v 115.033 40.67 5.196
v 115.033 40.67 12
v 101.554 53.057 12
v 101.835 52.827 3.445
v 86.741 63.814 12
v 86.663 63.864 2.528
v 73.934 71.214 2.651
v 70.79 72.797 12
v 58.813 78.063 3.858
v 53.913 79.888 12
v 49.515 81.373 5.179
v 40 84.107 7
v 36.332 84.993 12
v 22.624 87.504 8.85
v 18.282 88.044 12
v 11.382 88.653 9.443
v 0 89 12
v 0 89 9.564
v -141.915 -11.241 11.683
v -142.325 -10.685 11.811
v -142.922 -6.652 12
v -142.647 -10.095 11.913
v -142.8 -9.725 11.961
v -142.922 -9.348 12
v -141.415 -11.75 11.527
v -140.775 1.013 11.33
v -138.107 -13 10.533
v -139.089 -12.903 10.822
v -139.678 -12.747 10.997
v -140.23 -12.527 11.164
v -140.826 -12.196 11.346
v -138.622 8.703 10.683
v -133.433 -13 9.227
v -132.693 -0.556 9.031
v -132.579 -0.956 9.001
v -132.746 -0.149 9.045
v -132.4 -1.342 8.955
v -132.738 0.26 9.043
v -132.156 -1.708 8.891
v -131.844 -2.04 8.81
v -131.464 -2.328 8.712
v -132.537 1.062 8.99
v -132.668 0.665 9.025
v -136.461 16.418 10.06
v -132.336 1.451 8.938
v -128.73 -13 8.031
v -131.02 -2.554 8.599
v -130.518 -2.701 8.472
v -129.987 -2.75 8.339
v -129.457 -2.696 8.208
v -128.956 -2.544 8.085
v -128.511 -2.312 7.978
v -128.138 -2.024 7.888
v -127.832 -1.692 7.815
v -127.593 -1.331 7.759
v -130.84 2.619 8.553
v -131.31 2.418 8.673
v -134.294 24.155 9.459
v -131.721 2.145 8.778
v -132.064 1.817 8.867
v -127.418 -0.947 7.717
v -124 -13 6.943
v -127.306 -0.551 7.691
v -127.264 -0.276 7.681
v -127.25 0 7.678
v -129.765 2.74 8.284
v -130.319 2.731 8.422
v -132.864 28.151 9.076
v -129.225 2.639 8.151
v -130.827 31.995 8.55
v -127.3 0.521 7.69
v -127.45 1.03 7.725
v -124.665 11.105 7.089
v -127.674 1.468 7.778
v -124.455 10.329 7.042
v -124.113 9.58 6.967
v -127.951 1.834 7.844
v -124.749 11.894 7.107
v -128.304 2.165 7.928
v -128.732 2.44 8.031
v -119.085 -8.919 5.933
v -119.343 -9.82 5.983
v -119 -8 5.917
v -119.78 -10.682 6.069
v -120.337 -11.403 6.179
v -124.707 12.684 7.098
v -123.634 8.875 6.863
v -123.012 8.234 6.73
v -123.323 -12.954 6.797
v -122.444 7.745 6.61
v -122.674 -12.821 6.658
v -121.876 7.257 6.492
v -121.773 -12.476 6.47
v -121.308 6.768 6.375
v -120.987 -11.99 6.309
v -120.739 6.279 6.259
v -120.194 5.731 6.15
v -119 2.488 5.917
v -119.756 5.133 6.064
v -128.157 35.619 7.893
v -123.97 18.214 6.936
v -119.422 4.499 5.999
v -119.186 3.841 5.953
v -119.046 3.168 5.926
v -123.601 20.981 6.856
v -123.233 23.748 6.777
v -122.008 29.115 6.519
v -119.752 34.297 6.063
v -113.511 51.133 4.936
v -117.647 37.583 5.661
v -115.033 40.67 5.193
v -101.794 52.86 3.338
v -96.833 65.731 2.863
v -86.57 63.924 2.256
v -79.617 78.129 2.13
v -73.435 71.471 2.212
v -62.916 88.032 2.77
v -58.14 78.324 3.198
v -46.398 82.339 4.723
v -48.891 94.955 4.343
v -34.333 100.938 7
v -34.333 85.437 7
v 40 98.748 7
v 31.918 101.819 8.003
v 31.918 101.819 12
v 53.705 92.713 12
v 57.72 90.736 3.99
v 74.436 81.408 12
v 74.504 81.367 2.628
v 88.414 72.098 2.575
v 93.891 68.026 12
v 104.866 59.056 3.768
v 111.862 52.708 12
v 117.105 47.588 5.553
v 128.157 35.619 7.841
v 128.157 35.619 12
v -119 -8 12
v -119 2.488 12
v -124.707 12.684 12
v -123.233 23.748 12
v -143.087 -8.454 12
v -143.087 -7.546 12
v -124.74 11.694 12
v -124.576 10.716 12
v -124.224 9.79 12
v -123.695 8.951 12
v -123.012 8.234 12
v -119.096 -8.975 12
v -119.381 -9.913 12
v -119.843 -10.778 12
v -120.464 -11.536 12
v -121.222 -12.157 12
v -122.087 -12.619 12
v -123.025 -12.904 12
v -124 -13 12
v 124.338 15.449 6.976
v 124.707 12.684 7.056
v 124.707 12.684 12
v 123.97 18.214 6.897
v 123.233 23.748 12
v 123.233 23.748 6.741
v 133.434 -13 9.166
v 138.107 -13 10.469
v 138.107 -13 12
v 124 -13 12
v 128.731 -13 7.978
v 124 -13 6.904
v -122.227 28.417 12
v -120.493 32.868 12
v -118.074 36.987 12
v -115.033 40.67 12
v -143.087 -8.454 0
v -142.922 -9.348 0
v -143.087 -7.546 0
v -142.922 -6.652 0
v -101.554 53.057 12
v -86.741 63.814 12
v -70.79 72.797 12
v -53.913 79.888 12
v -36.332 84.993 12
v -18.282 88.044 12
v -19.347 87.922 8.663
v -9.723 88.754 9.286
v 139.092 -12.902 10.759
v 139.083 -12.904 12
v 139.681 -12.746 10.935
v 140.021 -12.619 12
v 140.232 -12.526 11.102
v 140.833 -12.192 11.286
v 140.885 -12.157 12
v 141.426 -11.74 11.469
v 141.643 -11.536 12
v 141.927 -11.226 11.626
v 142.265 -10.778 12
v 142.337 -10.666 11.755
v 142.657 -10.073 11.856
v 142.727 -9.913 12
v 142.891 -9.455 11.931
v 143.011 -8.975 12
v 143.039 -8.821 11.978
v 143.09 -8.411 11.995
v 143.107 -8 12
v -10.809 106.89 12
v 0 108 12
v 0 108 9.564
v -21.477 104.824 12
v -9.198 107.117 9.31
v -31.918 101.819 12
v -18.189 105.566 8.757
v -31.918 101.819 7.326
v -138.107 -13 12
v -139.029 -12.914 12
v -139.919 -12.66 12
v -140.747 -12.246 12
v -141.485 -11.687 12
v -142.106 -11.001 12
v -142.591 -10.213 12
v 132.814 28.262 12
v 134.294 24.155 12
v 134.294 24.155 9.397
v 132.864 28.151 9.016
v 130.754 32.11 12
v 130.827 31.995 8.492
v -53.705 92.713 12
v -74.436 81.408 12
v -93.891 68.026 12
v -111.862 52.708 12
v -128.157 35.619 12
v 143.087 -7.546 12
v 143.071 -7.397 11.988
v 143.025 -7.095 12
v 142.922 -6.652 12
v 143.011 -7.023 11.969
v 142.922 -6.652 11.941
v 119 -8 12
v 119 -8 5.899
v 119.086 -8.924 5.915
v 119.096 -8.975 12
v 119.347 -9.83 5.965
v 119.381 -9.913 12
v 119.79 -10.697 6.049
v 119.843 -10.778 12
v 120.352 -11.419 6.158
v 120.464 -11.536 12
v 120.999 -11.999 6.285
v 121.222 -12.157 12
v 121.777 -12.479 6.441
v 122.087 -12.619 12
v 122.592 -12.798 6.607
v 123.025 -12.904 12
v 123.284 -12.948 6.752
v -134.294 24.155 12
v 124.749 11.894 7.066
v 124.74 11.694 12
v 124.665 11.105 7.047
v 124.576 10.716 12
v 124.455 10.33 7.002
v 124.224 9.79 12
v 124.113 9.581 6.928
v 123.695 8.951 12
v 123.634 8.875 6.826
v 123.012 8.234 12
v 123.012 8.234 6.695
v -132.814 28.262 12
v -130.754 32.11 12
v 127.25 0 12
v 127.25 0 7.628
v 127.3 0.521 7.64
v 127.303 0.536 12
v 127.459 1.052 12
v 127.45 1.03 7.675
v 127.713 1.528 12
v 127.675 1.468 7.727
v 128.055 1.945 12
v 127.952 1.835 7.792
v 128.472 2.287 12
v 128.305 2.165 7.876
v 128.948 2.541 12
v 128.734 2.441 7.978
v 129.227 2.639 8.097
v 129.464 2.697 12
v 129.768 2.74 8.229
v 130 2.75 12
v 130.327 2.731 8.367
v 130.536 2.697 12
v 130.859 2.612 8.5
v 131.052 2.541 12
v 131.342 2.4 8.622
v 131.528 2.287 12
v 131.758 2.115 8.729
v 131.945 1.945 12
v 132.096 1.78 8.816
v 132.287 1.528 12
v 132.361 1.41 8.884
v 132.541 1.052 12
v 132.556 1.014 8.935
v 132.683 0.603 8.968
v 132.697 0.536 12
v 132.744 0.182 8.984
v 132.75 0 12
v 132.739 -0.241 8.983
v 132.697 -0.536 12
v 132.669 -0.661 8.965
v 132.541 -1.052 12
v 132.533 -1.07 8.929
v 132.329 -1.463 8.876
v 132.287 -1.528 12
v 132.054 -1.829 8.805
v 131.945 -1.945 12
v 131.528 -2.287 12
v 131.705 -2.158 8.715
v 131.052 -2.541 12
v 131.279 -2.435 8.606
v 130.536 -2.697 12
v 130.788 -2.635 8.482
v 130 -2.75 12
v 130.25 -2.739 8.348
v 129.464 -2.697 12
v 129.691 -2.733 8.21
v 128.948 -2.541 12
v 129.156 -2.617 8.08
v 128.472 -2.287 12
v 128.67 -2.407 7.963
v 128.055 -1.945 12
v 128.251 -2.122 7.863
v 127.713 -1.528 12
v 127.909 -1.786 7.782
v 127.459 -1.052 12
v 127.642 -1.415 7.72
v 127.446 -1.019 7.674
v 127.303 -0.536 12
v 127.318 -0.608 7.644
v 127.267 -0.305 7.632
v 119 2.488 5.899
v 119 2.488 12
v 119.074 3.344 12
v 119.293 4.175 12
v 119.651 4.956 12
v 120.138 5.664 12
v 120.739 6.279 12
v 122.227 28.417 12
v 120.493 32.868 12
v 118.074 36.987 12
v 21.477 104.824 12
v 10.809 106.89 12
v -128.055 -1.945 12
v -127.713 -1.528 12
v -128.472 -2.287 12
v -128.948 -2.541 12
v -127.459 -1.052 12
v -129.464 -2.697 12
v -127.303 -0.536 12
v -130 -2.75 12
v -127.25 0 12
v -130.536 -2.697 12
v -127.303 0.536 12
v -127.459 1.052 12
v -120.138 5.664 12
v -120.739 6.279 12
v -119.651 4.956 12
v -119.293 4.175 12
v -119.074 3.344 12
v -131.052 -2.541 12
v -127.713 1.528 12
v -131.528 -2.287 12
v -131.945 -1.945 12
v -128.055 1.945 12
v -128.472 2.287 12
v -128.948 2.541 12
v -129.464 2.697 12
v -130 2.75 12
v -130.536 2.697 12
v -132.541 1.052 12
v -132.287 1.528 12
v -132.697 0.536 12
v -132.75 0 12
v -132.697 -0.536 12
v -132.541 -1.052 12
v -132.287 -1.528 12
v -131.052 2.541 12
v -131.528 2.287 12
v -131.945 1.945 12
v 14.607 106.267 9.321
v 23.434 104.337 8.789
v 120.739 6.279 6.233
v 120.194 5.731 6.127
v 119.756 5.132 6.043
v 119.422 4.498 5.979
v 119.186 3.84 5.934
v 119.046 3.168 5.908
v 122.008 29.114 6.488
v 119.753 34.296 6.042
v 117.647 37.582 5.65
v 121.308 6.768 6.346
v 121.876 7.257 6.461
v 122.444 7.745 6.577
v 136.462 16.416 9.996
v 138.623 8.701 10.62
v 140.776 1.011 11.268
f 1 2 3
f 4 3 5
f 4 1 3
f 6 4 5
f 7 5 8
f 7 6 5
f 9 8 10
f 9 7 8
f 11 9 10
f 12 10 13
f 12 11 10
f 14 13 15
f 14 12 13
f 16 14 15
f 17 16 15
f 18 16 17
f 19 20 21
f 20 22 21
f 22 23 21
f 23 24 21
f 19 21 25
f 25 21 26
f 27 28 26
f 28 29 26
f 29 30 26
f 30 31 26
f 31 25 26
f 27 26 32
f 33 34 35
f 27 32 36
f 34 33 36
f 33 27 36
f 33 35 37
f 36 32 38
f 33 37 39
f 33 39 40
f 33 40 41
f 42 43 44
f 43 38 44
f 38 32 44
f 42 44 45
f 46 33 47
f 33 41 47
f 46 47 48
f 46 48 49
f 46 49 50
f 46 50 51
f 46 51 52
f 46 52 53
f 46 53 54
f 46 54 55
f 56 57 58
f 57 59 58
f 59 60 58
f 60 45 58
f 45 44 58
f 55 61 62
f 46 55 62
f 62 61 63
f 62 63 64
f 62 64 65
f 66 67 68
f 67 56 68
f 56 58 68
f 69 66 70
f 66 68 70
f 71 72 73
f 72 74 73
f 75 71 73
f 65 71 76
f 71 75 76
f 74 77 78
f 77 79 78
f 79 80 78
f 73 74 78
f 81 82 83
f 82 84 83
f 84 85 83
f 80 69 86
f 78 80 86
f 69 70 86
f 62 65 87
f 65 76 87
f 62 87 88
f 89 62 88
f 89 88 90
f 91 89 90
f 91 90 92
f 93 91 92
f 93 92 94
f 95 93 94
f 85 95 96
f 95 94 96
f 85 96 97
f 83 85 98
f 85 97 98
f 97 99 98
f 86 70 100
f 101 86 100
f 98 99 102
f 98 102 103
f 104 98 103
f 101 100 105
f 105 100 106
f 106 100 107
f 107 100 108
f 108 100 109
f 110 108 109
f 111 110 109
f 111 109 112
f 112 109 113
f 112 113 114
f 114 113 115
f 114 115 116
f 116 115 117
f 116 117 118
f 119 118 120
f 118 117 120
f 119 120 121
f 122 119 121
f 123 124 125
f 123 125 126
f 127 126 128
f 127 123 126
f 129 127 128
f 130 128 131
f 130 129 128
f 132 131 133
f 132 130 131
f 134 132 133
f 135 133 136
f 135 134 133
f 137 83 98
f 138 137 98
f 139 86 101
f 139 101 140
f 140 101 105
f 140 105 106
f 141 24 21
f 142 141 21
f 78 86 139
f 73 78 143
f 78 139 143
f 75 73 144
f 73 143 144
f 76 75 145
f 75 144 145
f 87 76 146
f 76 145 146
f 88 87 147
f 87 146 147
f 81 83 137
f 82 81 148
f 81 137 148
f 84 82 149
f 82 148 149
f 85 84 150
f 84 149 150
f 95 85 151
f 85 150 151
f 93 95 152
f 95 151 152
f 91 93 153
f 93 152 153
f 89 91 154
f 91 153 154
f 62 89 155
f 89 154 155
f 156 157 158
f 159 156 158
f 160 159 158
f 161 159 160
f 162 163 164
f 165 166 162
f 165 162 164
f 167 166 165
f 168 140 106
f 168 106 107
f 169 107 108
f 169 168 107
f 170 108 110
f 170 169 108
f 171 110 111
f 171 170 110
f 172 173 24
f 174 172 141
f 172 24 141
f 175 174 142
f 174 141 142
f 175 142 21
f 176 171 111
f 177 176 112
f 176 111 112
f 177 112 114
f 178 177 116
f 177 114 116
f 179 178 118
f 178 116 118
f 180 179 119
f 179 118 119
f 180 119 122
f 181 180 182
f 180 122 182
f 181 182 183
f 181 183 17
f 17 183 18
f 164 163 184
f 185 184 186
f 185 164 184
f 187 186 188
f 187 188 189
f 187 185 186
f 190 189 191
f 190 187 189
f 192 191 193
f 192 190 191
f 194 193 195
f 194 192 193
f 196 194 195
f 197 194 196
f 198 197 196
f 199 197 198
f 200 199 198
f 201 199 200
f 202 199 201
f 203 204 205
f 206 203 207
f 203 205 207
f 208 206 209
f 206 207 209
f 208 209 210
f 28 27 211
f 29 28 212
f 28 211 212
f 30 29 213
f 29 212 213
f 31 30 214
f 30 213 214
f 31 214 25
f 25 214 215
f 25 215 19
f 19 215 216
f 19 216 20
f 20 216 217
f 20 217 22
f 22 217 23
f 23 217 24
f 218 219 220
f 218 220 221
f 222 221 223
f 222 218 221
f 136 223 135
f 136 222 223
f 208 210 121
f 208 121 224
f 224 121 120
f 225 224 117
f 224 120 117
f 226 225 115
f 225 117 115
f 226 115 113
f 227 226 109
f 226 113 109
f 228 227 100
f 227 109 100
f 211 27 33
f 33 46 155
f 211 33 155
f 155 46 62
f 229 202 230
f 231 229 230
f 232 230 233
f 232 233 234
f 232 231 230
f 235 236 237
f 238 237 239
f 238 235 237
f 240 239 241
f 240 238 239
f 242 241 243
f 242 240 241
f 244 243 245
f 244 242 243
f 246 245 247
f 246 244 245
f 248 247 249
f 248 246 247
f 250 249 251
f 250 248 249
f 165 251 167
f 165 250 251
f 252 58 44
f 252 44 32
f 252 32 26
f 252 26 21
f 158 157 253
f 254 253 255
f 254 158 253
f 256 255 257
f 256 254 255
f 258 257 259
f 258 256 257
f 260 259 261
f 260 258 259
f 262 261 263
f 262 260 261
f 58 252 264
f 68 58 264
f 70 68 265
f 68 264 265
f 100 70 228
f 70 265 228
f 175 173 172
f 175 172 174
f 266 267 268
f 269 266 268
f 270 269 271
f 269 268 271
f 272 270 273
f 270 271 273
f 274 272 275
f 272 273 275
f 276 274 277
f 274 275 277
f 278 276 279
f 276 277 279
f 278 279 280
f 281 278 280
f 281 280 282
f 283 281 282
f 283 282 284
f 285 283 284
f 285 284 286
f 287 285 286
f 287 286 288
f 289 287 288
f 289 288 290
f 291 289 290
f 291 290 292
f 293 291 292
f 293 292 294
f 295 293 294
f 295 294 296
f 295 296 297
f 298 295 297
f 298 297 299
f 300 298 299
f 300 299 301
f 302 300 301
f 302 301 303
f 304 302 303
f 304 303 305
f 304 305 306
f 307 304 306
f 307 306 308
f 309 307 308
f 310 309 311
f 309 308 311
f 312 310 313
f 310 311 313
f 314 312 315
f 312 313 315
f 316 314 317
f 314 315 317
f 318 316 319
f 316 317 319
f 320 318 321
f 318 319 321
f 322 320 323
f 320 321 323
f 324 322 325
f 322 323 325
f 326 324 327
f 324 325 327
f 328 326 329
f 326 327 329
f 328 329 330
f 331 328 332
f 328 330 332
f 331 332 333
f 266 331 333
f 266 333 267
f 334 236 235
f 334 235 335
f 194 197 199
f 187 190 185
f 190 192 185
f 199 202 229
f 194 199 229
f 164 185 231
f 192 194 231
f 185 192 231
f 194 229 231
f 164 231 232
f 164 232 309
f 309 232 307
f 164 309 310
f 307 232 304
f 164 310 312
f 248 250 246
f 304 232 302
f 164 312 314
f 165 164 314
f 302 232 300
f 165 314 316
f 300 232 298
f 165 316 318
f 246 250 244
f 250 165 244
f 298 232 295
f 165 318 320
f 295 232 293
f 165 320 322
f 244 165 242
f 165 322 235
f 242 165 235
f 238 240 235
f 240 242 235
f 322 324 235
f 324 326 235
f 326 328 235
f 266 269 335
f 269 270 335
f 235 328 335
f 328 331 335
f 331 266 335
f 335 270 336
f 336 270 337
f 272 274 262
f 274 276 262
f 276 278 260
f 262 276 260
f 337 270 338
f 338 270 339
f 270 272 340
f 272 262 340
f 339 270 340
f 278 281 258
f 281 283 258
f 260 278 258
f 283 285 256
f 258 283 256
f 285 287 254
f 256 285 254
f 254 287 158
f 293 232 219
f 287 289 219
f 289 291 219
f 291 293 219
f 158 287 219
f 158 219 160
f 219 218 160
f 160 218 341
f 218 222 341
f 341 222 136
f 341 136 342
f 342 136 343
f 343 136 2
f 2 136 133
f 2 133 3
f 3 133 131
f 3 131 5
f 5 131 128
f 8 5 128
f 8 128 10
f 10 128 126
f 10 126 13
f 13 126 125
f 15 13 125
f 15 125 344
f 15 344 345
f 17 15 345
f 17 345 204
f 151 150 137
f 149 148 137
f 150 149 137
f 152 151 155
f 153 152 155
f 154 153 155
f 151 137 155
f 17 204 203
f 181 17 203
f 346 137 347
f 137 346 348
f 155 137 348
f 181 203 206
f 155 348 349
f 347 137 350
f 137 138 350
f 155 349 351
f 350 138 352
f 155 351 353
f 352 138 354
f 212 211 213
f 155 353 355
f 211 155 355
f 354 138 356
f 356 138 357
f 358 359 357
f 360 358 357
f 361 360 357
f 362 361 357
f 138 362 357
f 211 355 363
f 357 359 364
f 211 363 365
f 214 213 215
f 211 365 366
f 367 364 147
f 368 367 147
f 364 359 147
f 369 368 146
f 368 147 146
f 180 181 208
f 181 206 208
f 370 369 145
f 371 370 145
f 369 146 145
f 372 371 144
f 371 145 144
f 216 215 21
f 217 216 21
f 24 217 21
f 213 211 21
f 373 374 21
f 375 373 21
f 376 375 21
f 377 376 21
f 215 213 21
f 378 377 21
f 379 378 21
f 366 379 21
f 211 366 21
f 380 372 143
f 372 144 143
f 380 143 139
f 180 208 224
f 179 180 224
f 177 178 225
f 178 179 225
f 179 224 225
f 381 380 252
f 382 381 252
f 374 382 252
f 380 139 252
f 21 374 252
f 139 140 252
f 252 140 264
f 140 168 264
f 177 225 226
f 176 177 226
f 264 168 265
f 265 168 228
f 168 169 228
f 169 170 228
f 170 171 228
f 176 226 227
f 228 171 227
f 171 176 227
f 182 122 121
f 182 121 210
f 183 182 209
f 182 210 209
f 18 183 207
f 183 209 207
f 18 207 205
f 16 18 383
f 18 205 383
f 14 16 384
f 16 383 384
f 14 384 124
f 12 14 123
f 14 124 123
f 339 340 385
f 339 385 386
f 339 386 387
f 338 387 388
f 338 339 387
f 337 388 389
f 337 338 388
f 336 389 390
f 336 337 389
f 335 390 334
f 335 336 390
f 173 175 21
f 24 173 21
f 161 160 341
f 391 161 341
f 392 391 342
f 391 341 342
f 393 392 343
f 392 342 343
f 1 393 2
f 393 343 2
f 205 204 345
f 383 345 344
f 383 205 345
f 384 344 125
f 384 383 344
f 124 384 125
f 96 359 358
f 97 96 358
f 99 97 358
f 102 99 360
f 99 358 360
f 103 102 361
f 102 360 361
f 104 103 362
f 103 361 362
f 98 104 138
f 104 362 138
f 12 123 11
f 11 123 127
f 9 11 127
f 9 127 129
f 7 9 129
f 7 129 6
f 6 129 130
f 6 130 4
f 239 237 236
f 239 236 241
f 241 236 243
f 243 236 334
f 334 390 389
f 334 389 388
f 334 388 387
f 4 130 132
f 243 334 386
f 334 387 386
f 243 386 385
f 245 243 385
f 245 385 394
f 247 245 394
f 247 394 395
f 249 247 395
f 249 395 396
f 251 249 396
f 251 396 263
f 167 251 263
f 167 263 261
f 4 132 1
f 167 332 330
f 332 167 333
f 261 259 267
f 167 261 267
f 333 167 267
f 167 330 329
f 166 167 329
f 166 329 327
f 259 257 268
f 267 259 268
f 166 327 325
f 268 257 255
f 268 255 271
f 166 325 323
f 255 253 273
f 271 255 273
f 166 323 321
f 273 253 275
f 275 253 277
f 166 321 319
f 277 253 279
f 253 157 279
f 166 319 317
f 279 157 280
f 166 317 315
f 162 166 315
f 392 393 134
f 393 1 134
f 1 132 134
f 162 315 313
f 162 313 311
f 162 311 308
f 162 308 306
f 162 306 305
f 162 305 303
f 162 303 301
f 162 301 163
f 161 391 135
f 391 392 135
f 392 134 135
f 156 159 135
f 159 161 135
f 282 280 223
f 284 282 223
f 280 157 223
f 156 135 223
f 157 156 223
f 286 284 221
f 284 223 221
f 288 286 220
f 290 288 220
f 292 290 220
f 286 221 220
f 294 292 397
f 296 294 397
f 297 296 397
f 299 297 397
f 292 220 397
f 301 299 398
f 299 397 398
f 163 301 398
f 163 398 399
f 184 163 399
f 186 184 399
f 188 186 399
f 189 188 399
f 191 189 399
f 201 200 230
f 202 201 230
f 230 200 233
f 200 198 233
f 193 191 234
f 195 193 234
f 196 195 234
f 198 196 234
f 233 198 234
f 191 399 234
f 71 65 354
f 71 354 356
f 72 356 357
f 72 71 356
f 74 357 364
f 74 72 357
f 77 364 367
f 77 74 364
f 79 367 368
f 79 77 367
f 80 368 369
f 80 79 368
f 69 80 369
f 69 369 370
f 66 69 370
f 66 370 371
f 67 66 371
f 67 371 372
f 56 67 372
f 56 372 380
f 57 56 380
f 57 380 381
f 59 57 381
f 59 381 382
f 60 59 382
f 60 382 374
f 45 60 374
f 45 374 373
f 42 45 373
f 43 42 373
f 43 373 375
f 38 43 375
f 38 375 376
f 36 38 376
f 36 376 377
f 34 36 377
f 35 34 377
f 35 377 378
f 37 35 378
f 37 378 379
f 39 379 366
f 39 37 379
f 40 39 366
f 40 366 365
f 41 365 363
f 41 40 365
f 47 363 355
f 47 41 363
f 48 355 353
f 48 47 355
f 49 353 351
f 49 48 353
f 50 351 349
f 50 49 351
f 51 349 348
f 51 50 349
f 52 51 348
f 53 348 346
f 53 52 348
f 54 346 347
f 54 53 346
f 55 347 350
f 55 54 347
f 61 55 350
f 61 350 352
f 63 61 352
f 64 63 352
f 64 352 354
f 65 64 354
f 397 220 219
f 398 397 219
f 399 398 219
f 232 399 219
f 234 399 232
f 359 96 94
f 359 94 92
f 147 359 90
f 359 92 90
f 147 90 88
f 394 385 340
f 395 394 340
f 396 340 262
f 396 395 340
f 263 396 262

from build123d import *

# Parameters (mm, degrees)
ESQUISSE2_R             = 2.75
BOSS_EXTRU_1_DEPTH      = 12
CONG_1_R                = 30
CONG_2_R                = 30
CONG_3_R                = 5
CONG_4_R                = 5
CONG_5_R                = 5
CONG_6_R                = 5
CONG_1_OF_SYM_TRIE1_R   = 30
CONG_2_OF_SYM_TRIE1_R   = 30
CONG_3_OF_SYM_TRIE1_R   = 5
CONG_4_OF_SYM_TRIE1_R   = 5
CONG_5_OF_SYM_TRIE1_R   = 5
CONG_6_OF_SYM_TRIE1_R   = 5
ENL_V_MAT_EXTRU_6_DEPTH = 153


with BuildPart() as part:
    # Esquisse2 → Boss.-Extru.1 (new body)
    with BuildSketch(Plane.XY):
        with BuildLine():
            Line((-125.064319956, 10), (-122, 33))
            ThreePointArc((-122, 33), (-67.197277761, 74.501212265), (0, 89))
            Line((0, 89), (0, 108))
            ThreePointArc((0, 108), (-16.165722488, 105.975834437), (-31.918403878, 101.818809198))
            ThreePointArc((-31.918403878, 101.818809198), (-87.157005326, 72.996548183), (-132.564319956, 30.332727469))
            Line((-132.564319956, 30.332727469), (-144.7, -13))
            Line((-144.7, -13), (-119, -13))
            Line((-119, -13), (-119, 4.782335439))
            Line((-119, 4.782335439), (-125.064319956, 10))
        make_face()
        with Locations((-130, 0)):
            Circle(ESQUISSE2_R, mode=Mode.SUBTRACT)
    boss_extru_1 = extrude(amount=BOSS_EXTRU_1_DEPTH)

    # Congé1
    cong_1_edges = [part.edges().sort_by_distance(p)[0] for p in [
        (-132.564319956, 30.332727469, 6),
    ]]
    fillet(cong_1_edges, radius=CONG_1_R)

    # Congé2
    cong_2_edges = [part.edges().sort_by_distance(p)[0] for p in [
        (-122, 33, 6),
    ]]
    fillet(cong_2_edges, radius=CONG_2_R)

    # Congé3
    cong_3_edges = [part.edges().sort_by_distance(p)[0] for p in [
        (-125.064319956, 10, 6),
    ]]
    fillet(cong_3_edges, radius=CONG_3_R)

    # Congé4
    cong_4_edges = [part.edges().sort_by_distance(p)[0] for p in [
        (-119, 4.782335439, 6),
    ]]
    fillet(cong_4_edges, radius=CONG_4_R)

    # Congé5
    cong_5_edges = [part.edges().sort_by_distance(p)[0] for p in [
        (-119, -13, 6),
    ]]
    fillet(cong_5_edges, radius=CONG_5_R)

    # Congé6
    cong_6_edges = [part.edges().sort_by_distance(p)[0] for p in [
        (-144.7, -13, 6),
    ]]
    fillet(cong_6_edges, radius=CONG_6_R)

    # Symétrie1: Boss.-Extru.1 across plane
    add(boss_extru_1.mirror(Plane(origin=(0, 108, 12), x_dir=(0, 0, 1), z_dir=(-1, 0, 0))))

    # Congé1 of Symétrie1
    cong_1_of_sym_trie1_edges = [part.edges().sort_by_distance(p)[0] for p in [
        (132.564319956, 30.332727469, 6),
    ]]
    fillet(cong_1_of_sym_trie1_edges, radius=CONG_1_OF_SYM_TRIE1_R)

    # Congé2 of Symétrie1
    cong_2_of_sym_trie1_edges = [part.edges().sort_by_distance(p)[0] for p in [
        (122, 33, 6),
    ]]
    fillet(cong_2_of_sym_trie1_edges, radius=CONG_2_OF_SYM_TRIE1_R)

    # Congé3 of Symétrie1
    cong_3_of_sym_trie1_edges = [part.edges().sort_by_distance(p)[0] for p in [
        (125.064319956, 10, 6),
    ]]
    fillet(cong_3_of_sym_trie1_edges, radius=CONG_3_OF_SYM_TRIE1_R)

    # Congé4 of Symétrie1
    cong_4_of_sym_trie1_edges = [part.edges().sort_by_distance(p)[0] for p in [
        (119, 4.782335439, 6),
    ]]
    fillet(cong_4_of_sym_trie1_edges, radius=CONG_4_OF_SYM_TRIE1_R)

    # Congé5 of Symétrie1
    cong_5_of_sym_trie1_edges = [part.edges().sort_by_distance(p)[0] for p in [
        (119, -13, 6),
    ]]
    fillet(cong_5_of_sym_trie1_edges, radius=CONG_5_OF_SYM_TRIE1_R)

    # Congé6 of Symétrie1
    cong_6_of_sym_trie1_edges = [part.edges().sort_by_distance(p)[0] for p in [
        (144.7, -13, 6),
    ]]
    fillet(cong_6_of_sym_trie1_edges, radius=CONG_6_OF_SYM_TRIE1_R)

    # Esquisse9 → Enlèv. mat.-Extru.6 (cut)
    with BuildSketch(Plane(origin=(0, 108, 0), x_dir=(1, 0, 0), z_dir=(0, 1, 0))):
        with BuildLine():
            Line((143.107329358, -12), (143.107329358, 11.686377944))
            Line((143.107329358, 11.686377944), (-142.922076855, 11.686377944))
            Line((-142.922076855, 11.686377944), (-142.922076855, -12))
            ThreePointArc((-142.922076855, -12), (-88.956734655, -2.351996966), (-34.333129967, -7))
            ThreePointArc((-34.333129967, -7), (2.833435017, -9.579184192), (40, -7))
            ThreePointArc((40, -7), (91.882795923, -2.712831285), (143.107329358, -12))
        make_face()
    extrude(amount=-ENL_V_MAT_EXTRU_6_DEPTH, mode=Mode.SUBTRACT)


with BuildPart() as enl_v_mat_extru_6_piece_1:
    # of the separate pieces the step leaves, piece 1, a body of its own (enl_v_mat_extru_6_pieces)
    add(part.part.solids().sort_by_distance((138.107329358, -13, 10.46895452))[0])


with BuildPart() as enl_v_mat_extru_6_piece_2:
    # of the separate pieces the step leaves, piece 2, a body of its own (enl_v_mat_extru_6_pieces)
    add(part.part.solids().sort_by_distance((-142.922076855, -6.651591106, 0))[0])


solid = Compound([enl_v_mat_extru_6_piece_1.part, enl_v_mat_extru_6_piece_2.part])
